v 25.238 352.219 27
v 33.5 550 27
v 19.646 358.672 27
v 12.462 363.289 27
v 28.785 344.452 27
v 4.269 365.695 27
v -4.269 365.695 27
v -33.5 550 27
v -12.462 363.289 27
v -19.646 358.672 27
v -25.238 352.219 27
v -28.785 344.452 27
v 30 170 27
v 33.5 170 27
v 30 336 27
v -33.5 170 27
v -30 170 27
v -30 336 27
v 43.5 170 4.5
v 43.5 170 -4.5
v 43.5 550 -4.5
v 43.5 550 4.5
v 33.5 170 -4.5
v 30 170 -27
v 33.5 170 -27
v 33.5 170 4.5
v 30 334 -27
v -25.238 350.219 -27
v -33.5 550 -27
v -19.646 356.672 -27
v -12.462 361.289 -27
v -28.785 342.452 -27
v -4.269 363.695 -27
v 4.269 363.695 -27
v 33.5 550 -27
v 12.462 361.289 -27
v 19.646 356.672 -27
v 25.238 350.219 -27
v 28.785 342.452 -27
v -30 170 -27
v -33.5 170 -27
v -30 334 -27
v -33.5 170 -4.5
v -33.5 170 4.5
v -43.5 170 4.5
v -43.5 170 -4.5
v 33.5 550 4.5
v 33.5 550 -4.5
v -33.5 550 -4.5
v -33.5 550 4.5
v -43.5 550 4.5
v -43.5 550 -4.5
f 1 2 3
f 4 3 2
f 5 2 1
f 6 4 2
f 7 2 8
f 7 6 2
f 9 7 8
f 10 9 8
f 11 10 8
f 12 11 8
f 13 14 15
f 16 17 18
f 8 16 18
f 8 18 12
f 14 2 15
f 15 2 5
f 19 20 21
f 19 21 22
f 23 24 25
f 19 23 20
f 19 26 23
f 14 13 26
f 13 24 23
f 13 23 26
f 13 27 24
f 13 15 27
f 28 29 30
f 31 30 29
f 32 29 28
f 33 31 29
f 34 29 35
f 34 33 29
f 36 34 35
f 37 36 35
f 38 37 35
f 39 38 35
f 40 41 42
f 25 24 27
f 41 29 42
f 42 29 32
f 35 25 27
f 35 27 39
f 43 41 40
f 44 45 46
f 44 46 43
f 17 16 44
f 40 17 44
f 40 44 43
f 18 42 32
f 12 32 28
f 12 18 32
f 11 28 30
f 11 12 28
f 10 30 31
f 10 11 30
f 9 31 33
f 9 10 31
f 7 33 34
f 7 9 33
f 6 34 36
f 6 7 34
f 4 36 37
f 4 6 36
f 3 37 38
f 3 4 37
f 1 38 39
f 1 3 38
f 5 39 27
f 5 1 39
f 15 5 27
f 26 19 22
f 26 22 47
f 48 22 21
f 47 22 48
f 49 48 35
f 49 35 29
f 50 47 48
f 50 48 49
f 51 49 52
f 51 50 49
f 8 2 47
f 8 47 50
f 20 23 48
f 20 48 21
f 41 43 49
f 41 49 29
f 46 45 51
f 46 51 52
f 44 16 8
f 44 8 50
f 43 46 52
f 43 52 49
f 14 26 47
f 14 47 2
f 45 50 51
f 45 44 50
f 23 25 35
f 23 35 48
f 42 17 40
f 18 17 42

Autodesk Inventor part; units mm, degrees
ref_plane "YZ Plane" through (0, 0, 0) normal (1, 0, 0) x (0, 1, 0)
ref_plane "XZ Plane" through (0, 0, 0) normal (0, 1, 0) x (-1, 0, 0)
ref_plane "XY Plane" through (0, 0, 0) normal (0, 0, 1) x (1, 0, 0)
sketch "草圖1" plane through (0, 0, 0) normal (0, 1, 0) x (-1, 0, 0)
  line L0 (-33.5, 27) -> (33.5, 27)
  line L1 (33.5, 27) -> (33.5, -27)
  line L2 (33.5, -27) -> (-33.5, -27)
  line L3 (-33.5, -27) -> (-33.5, 27)
  line L4 (-33.5, 27) -> (33.5, -27) construction
  line L5 (33.5, 27) -> (-33.5, -27) construction
  line L6 (43.5, -4.5) -> (33.5, -4.5)
  line L7 (33.5, -4.5) -> (33.5, 4.5)
  line L8 (33.5, 4.5) -> (43.5, 4.5)
  line L9 (43.5, 4.5) -> (43.5, -4.5)
  line L10 (-33.5, -4.5) -> (-43.5, -4.5)
  line L11 (-43.5, -4.5) -> (-43.5, 4.5)
  line L12 (-43.5, 4.5) -> (-33.5, 4.5)
  line L13 (-33.5, 4.5) -> (-33.5, -4.5)
  point P0 (0, 0)
  point P1 (33.5, 0)
  point P2 (-33.5, 0)
  point P3 (-33.5, 4.5)
  point P4 (-33.5, -4.5)
  dimension "d0" = 67
  dimension "d1" = 54
  dimension "d2" = 9
  dimension "d3" = 10
extrude "擠出1" add sketch "草圖1" along normal blind 550
sketch "草圖2" plane through (-33.5, 0, 27) normal (0, 0, 1) x (1, 0, 0)
  line L0 (0, 0) -> (0, 550) projected
  line L1 (0, 550) -> (67, 550) projected
  line L2 (67, 550) -> (67, 0) projected
  line L3 (67, 0) -> (0, 0) projected
  circle A0 centre (33.5, 298) radius 30
  line L4 (3.5, 298) -> (63.5, 298)
  line L5 (63.5, 298) -> (63.5, -29.8228)
  line L6 (63.5, -29.8228) -> (3.5, -29.8228)
  line L7 (3.5, -29.8228) -> (3.5, 298)
  point P0 (33.5, 0)
  point P1 (33.5, 0)
  point P2 (63.5, 298)
  point P3 (3.5, 298)
  dimension "d6" = 298
  dimension "d7" = 60
extrude "擠出2" cut sketch "草圖2" against normal through all contours L7 A0 L5 L3 | L3 L5 L6 L7 | L4 A0 | A0 L4
sketch "草圖3" plane through (-33.5, 550, 27) normal (0, 0, 1) x (1, 0, 0)
  line L0 (-83.0897, -380) -> (150.0897, -380)
  line L1 (150.0897, -380) -> (150.0897, -550)
  line L2 (150.0897, -550) -> (-83.0897, -550)
  line L3 (-83.0897, -550) -> (-83.0897, -380)
  point P0 (33.5, -550)
  point P1 (33.5, -550)
  dimension "d10" = 170
extrude "擠出3" cut sketch "草圖3" against normal through all
sketch "草圖4" plane through (33.5, 550, -27) normal (0, 0, -1) x (-1, 0, 0)
  arc A0 (63.5, -252) -> (3.5, -252) centre (33.5, -252) ccw construction
  circle A1 centre (33.5, -216) radius 30
  line L0 (63.5, -380) -> (3.5, -380)
  line L1 (3.5, -380) -> (3.5, -216)
  line L2 (3.5, -216) -> (63.5, -216)
  line L3 (63.5, -216) -> (63.5, -380)
  point P0 (33.5, -550)
  point P1 (63.5, -380)
  dimension "d13" = 36
  dimension "d14" = 60
sketch "草圖5" plane through (-33.5, 550, 27) normal (0, 0, 1) x (1, 0, 0)
  circle A0 centre (33.5, -214) radius 30
  arc A1 (63.5, -252) -> (3.5, -252) centre (33.5, -252) ccw construction
  line L0 (63.5, -380) -> (3.5, -380)
  line L1 (3.5, -380) -> (3.5, -214)
  line L2 (3.5, -214) -> (63.5, -214)
  line L3 (63.5, -214) -> (63.5, -380)
  point P0 (33.5, -550)
  point P1 (63.5, -380)
  dimension "d15" = 38
  dimension "d16" = 60
loft "斷面混成1" cut profiles "草圖4", "草圖5"
properties part number "Slider-10"
